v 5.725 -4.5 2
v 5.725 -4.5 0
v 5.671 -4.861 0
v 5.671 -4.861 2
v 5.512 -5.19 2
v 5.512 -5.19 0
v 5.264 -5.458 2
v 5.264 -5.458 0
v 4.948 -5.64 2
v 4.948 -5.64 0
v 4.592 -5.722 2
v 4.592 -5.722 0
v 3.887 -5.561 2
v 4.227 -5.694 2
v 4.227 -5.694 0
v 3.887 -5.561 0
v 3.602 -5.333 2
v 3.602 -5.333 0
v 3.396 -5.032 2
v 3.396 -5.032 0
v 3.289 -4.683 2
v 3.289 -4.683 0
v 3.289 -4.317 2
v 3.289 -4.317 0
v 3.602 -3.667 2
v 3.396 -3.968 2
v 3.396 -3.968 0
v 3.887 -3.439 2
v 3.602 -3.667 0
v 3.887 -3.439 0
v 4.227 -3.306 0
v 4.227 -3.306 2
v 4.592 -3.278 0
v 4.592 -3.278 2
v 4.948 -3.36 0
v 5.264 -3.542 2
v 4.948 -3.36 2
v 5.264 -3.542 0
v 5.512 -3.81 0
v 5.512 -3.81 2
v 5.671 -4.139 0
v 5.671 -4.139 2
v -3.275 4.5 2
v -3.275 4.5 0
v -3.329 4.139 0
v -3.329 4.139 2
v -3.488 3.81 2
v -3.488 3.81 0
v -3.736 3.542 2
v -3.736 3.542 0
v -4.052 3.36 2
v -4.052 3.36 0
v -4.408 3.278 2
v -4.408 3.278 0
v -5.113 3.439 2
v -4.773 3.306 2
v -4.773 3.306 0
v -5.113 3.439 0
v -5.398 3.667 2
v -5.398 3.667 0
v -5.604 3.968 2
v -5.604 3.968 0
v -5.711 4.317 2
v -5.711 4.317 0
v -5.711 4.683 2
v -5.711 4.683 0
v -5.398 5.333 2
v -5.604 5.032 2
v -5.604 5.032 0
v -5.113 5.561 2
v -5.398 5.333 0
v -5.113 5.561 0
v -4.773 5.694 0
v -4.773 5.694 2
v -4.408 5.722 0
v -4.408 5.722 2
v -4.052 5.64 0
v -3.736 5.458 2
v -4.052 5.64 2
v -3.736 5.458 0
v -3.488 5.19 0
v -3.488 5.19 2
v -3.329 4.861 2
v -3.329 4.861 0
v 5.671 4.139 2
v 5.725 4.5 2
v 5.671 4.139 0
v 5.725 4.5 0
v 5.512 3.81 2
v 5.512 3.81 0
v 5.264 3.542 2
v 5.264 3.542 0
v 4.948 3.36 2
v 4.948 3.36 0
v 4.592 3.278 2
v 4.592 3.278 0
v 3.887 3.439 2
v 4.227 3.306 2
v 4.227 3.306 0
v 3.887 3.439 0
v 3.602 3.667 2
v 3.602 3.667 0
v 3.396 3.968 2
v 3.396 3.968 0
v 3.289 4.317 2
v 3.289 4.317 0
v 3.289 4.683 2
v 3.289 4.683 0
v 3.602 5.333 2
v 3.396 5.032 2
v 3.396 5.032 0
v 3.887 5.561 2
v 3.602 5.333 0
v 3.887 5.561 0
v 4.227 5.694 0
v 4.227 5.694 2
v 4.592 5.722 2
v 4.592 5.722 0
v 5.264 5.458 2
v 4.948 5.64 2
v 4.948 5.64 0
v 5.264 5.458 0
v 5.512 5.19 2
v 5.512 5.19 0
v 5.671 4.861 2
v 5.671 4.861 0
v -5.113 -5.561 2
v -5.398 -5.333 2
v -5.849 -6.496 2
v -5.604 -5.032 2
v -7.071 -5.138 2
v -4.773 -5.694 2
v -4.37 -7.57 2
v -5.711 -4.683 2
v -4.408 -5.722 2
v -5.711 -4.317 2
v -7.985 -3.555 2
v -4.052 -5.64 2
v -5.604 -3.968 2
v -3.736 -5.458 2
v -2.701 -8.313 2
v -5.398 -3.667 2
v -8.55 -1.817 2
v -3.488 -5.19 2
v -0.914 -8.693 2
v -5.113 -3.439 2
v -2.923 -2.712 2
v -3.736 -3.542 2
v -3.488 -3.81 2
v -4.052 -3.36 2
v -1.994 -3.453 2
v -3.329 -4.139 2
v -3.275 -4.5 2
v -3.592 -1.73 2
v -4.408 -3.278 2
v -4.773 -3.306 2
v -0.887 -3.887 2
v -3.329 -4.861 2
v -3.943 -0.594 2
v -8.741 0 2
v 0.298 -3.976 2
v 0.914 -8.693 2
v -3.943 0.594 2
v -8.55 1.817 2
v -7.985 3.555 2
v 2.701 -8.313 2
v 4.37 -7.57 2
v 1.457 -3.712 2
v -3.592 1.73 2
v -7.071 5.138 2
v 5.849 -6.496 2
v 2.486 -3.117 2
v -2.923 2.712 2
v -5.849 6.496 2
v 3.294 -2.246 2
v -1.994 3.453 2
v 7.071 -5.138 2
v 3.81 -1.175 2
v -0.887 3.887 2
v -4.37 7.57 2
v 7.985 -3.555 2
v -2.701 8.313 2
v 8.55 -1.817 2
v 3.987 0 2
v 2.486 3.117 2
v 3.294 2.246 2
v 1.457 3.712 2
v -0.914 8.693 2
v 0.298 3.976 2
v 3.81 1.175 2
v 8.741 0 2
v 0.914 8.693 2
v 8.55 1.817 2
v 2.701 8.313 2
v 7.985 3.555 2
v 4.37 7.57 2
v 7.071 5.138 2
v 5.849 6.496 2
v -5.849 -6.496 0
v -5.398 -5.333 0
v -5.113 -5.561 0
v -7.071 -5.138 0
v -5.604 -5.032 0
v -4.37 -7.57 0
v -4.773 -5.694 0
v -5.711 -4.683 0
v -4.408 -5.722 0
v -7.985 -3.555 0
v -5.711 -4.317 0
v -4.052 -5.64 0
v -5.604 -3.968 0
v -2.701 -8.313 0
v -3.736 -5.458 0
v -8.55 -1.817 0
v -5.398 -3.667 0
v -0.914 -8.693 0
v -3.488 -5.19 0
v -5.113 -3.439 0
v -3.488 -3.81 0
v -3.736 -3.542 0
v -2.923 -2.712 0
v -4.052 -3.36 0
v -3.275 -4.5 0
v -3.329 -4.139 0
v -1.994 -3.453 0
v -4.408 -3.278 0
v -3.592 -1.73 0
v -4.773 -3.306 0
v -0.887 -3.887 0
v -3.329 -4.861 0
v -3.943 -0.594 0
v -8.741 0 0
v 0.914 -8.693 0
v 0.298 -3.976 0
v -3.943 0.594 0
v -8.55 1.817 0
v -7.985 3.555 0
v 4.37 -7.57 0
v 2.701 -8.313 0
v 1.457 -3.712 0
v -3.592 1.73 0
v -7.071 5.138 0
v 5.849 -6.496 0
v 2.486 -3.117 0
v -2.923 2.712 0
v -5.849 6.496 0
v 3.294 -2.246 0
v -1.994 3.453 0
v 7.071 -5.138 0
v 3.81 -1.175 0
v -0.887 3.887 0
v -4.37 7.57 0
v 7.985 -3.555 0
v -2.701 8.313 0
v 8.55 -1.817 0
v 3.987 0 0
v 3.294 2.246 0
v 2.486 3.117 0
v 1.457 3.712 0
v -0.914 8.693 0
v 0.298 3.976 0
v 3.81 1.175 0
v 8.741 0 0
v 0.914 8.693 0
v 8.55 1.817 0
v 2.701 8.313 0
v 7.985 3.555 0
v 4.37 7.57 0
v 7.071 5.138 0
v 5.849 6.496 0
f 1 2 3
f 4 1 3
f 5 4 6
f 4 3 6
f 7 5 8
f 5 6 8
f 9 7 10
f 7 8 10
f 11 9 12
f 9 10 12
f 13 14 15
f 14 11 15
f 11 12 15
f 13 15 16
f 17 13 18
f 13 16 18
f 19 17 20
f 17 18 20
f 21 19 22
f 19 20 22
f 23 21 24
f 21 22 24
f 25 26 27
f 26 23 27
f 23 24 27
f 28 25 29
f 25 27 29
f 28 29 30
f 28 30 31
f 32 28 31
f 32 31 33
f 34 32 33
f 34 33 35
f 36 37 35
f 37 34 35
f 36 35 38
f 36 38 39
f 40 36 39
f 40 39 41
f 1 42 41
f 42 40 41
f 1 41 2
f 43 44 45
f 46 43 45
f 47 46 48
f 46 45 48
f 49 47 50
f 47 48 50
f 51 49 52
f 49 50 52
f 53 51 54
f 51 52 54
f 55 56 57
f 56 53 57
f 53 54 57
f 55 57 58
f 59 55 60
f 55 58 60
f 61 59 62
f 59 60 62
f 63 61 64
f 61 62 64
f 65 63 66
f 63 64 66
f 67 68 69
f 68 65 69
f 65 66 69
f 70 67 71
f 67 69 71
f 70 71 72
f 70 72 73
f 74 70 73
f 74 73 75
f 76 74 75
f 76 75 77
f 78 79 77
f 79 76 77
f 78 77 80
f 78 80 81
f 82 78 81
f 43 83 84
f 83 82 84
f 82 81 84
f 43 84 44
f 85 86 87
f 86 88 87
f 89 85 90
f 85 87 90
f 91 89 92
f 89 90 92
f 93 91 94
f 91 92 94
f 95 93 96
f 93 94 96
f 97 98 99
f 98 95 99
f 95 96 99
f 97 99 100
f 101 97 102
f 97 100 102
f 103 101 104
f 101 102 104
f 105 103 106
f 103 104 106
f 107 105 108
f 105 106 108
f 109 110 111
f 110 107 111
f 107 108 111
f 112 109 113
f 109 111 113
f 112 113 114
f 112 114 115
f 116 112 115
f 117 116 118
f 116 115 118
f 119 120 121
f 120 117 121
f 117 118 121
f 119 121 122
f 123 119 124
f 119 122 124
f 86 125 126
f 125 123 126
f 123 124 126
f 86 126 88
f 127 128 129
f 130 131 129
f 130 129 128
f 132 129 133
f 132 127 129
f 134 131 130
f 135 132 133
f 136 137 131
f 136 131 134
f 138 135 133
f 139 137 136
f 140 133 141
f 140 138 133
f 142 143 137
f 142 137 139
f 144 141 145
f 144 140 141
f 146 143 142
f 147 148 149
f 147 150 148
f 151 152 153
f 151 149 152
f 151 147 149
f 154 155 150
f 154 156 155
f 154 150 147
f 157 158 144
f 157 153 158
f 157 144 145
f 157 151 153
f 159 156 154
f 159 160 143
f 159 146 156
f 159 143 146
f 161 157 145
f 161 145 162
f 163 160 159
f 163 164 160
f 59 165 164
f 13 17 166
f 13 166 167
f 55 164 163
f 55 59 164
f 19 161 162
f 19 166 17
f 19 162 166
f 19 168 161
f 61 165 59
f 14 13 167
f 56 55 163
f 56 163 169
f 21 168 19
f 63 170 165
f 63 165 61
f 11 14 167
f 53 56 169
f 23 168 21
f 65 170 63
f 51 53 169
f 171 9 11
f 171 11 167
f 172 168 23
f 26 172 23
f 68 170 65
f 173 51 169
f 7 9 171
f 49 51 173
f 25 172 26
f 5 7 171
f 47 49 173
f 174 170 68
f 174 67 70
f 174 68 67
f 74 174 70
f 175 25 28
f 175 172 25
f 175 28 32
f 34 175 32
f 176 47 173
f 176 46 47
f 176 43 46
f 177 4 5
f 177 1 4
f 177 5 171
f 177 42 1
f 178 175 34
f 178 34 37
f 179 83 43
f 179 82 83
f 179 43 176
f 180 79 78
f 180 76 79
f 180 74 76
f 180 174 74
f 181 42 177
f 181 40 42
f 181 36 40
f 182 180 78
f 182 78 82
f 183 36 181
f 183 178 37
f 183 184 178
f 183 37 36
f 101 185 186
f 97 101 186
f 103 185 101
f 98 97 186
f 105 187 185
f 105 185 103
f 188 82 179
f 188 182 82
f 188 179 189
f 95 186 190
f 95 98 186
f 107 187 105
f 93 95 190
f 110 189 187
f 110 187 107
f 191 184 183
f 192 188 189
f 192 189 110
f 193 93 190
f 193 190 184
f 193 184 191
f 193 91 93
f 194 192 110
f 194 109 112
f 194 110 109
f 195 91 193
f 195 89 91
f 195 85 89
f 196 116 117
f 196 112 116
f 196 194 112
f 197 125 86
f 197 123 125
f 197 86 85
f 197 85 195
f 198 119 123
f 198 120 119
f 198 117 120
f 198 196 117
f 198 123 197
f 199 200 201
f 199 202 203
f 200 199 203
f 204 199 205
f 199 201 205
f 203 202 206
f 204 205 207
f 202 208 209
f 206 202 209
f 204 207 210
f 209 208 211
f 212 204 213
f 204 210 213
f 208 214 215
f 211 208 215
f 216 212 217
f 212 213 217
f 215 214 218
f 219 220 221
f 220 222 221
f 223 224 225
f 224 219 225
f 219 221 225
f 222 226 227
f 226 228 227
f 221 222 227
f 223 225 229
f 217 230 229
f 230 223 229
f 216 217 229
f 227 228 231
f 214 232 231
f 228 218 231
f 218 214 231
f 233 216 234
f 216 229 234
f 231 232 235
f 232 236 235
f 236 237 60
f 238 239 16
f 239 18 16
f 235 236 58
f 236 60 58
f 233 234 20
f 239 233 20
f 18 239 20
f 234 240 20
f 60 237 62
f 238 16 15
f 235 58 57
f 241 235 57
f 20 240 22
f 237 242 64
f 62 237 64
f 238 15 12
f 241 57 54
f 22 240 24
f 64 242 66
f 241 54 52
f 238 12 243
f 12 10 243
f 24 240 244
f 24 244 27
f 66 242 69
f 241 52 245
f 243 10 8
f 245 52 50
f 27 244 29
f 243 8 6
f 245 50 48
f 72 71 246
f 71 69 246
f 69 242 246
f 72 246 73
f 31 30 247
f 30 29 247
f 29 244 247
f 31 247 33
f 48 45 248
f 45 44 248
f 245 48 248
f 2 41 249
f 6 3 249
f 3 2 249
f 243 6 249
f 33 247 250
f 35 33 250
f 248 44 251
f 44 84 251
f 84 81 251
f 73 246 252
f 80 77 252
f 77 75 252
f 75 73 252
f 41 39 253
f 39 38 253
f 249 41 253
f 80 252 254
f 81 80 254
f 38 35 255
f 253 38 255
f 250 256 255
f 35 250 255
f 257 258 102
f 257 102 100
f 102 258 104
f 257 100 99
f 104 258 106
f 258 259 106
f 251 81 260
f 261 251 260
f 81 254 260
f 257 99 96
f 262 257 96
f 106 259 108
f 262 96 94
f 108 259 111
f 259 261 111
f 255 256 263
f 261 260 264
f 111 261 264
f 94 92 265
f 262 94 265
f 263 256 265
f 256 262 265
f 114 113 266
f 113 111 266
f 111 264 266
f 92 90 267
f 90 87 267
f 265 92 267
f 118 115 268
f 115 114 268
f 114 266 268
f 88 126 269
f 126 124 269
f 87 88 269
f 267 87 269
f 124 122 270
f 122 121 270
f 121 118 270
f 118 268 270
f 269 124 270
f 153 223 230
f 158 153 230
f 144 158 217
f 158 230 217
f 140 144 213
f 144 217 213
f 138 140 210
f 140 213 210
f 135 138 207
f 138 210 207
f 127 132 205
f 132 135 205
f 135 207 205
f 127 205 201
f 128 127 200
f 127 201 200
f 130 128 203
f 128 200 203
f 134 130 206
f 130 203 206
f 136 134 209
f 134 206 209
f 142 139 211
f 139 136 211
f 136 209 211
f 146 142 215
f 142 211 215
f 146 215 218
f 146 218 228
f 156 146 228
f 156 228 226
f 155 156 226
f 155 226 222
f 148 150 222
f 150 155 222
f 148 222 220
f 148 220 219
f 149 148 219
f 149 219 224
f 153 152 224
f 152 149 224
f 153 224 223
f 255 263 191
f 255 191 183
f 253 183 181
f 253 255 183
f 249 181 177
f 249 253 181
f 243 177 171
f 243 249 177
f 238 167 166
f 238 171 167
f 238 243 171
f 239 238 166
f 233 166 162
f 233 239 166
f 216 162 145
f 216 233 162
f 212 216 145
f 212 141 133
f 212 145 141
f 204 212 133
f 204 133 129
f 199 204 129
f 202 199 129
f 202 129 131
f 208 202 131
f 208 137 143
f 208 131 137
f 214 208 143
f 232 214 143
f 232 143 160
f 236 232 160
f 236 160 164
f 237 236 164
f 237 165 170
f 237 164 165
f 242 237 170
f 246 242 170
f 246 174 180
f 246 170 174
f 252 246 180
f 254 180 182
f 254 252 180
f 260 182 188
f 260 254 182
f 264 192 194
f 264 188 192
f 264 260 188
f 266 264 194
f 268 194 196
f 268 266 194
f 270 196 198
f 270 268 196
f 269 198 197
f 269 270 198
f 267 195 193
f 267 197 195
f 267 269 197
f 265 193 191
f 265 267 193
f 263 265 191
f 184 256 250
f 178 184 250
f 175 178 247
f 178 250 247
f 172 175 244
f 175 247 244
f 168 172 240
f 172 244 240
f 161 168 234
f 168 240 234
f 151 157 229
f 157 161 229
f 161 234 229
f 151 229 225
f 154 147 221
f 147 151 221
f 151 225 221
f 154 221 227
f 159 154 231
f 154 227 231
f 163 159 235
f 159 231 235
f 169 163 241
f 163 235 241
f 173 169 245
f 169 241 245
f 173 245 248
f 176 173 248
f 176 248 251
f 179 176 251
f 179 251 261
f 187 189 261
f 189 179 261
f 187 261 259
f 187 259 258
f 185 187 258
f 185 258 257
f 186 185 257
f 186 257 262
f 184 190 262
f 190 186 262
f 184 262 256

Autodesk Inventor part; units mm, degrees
ref_plane "YZ Plane" through (0, 0, 0) normal (1, 0, 0) x (0, 1, 0)
ref_plane "XZ Plane" through (0, 0, 0) normal (0, 1, 0) x (-1, 0, 0)
ref_plane "XY Plane" through (0, 0, 0) normal (0, 0, 1) x (1, 0, 0)
sketch "Base" plane through (0, 0, 0) normal (0, 0, 1) x (1, 0, 0)
  circle A0 centre (0, 0) radius 3.9873
  circle A1 centre (0, 0) radius 8.7406
  line L0 (-4.5, -4.5) -> (4.5, -4.5) construction
  line L1 (4.5, -4.5) -> (4.5, 4.5) construction
  line L2 (4.5, 4.5) -> (-4.5, 4.5) construction
  line L3 (-4.5, 4.5) -> (-4.5, -4.5) construction
  line L4 (-4.5, -4.5) -> (4.5, 4.5) construction
  line L5 (4.5, -4.5) -> (-4.5, 4.5) construction
  line L6 (-12.2369, 0) -> (12.2369, 0) construction
  circle A2 centre (0, 0) radius 6.364 construction
  circle A3 centre (-4.5, 4.5) radius 1.225
  circle A4 centre (4.5, 4.5) radius 1.225
  circle A5 centre (4.5, -4.5) radius 1.225
  circle A6 centre (-4.5, -4.5) radius 1.225
  dimension "d0" = 7.9746
  dimension "d1" = 4.7533
  dimension "d2" = 2.3767
  dimension "d3" = 2.45
  dimension "d4" = 9
extrude "Plate1" add sketch "Base" along normal blind 2
equation "\"d2\" = 0.5 * d1"
equation "\"d7\" = Thickness"
equation "\"BendRadius\" = Thickness"
equation "\"BendReliefWidth\" = Thickness"
equation "\"BendReliefDepth\" = 0.5 * Thickness"
equation "\"CornerReliefSize\" = 4 * Thickness"
equation "\"MinimumRemnant\" = 2 * Thickness"
equation "\"TransitionRadius\" = BendRadius"
equation "\"JacobiRadiusSize\" = BendRadius"
equation "\"GapSize\" = Thickness"
equation "\"Thickness\" = 2"
properties part number "WheelEncoderMagnetAlignmentFlange"
